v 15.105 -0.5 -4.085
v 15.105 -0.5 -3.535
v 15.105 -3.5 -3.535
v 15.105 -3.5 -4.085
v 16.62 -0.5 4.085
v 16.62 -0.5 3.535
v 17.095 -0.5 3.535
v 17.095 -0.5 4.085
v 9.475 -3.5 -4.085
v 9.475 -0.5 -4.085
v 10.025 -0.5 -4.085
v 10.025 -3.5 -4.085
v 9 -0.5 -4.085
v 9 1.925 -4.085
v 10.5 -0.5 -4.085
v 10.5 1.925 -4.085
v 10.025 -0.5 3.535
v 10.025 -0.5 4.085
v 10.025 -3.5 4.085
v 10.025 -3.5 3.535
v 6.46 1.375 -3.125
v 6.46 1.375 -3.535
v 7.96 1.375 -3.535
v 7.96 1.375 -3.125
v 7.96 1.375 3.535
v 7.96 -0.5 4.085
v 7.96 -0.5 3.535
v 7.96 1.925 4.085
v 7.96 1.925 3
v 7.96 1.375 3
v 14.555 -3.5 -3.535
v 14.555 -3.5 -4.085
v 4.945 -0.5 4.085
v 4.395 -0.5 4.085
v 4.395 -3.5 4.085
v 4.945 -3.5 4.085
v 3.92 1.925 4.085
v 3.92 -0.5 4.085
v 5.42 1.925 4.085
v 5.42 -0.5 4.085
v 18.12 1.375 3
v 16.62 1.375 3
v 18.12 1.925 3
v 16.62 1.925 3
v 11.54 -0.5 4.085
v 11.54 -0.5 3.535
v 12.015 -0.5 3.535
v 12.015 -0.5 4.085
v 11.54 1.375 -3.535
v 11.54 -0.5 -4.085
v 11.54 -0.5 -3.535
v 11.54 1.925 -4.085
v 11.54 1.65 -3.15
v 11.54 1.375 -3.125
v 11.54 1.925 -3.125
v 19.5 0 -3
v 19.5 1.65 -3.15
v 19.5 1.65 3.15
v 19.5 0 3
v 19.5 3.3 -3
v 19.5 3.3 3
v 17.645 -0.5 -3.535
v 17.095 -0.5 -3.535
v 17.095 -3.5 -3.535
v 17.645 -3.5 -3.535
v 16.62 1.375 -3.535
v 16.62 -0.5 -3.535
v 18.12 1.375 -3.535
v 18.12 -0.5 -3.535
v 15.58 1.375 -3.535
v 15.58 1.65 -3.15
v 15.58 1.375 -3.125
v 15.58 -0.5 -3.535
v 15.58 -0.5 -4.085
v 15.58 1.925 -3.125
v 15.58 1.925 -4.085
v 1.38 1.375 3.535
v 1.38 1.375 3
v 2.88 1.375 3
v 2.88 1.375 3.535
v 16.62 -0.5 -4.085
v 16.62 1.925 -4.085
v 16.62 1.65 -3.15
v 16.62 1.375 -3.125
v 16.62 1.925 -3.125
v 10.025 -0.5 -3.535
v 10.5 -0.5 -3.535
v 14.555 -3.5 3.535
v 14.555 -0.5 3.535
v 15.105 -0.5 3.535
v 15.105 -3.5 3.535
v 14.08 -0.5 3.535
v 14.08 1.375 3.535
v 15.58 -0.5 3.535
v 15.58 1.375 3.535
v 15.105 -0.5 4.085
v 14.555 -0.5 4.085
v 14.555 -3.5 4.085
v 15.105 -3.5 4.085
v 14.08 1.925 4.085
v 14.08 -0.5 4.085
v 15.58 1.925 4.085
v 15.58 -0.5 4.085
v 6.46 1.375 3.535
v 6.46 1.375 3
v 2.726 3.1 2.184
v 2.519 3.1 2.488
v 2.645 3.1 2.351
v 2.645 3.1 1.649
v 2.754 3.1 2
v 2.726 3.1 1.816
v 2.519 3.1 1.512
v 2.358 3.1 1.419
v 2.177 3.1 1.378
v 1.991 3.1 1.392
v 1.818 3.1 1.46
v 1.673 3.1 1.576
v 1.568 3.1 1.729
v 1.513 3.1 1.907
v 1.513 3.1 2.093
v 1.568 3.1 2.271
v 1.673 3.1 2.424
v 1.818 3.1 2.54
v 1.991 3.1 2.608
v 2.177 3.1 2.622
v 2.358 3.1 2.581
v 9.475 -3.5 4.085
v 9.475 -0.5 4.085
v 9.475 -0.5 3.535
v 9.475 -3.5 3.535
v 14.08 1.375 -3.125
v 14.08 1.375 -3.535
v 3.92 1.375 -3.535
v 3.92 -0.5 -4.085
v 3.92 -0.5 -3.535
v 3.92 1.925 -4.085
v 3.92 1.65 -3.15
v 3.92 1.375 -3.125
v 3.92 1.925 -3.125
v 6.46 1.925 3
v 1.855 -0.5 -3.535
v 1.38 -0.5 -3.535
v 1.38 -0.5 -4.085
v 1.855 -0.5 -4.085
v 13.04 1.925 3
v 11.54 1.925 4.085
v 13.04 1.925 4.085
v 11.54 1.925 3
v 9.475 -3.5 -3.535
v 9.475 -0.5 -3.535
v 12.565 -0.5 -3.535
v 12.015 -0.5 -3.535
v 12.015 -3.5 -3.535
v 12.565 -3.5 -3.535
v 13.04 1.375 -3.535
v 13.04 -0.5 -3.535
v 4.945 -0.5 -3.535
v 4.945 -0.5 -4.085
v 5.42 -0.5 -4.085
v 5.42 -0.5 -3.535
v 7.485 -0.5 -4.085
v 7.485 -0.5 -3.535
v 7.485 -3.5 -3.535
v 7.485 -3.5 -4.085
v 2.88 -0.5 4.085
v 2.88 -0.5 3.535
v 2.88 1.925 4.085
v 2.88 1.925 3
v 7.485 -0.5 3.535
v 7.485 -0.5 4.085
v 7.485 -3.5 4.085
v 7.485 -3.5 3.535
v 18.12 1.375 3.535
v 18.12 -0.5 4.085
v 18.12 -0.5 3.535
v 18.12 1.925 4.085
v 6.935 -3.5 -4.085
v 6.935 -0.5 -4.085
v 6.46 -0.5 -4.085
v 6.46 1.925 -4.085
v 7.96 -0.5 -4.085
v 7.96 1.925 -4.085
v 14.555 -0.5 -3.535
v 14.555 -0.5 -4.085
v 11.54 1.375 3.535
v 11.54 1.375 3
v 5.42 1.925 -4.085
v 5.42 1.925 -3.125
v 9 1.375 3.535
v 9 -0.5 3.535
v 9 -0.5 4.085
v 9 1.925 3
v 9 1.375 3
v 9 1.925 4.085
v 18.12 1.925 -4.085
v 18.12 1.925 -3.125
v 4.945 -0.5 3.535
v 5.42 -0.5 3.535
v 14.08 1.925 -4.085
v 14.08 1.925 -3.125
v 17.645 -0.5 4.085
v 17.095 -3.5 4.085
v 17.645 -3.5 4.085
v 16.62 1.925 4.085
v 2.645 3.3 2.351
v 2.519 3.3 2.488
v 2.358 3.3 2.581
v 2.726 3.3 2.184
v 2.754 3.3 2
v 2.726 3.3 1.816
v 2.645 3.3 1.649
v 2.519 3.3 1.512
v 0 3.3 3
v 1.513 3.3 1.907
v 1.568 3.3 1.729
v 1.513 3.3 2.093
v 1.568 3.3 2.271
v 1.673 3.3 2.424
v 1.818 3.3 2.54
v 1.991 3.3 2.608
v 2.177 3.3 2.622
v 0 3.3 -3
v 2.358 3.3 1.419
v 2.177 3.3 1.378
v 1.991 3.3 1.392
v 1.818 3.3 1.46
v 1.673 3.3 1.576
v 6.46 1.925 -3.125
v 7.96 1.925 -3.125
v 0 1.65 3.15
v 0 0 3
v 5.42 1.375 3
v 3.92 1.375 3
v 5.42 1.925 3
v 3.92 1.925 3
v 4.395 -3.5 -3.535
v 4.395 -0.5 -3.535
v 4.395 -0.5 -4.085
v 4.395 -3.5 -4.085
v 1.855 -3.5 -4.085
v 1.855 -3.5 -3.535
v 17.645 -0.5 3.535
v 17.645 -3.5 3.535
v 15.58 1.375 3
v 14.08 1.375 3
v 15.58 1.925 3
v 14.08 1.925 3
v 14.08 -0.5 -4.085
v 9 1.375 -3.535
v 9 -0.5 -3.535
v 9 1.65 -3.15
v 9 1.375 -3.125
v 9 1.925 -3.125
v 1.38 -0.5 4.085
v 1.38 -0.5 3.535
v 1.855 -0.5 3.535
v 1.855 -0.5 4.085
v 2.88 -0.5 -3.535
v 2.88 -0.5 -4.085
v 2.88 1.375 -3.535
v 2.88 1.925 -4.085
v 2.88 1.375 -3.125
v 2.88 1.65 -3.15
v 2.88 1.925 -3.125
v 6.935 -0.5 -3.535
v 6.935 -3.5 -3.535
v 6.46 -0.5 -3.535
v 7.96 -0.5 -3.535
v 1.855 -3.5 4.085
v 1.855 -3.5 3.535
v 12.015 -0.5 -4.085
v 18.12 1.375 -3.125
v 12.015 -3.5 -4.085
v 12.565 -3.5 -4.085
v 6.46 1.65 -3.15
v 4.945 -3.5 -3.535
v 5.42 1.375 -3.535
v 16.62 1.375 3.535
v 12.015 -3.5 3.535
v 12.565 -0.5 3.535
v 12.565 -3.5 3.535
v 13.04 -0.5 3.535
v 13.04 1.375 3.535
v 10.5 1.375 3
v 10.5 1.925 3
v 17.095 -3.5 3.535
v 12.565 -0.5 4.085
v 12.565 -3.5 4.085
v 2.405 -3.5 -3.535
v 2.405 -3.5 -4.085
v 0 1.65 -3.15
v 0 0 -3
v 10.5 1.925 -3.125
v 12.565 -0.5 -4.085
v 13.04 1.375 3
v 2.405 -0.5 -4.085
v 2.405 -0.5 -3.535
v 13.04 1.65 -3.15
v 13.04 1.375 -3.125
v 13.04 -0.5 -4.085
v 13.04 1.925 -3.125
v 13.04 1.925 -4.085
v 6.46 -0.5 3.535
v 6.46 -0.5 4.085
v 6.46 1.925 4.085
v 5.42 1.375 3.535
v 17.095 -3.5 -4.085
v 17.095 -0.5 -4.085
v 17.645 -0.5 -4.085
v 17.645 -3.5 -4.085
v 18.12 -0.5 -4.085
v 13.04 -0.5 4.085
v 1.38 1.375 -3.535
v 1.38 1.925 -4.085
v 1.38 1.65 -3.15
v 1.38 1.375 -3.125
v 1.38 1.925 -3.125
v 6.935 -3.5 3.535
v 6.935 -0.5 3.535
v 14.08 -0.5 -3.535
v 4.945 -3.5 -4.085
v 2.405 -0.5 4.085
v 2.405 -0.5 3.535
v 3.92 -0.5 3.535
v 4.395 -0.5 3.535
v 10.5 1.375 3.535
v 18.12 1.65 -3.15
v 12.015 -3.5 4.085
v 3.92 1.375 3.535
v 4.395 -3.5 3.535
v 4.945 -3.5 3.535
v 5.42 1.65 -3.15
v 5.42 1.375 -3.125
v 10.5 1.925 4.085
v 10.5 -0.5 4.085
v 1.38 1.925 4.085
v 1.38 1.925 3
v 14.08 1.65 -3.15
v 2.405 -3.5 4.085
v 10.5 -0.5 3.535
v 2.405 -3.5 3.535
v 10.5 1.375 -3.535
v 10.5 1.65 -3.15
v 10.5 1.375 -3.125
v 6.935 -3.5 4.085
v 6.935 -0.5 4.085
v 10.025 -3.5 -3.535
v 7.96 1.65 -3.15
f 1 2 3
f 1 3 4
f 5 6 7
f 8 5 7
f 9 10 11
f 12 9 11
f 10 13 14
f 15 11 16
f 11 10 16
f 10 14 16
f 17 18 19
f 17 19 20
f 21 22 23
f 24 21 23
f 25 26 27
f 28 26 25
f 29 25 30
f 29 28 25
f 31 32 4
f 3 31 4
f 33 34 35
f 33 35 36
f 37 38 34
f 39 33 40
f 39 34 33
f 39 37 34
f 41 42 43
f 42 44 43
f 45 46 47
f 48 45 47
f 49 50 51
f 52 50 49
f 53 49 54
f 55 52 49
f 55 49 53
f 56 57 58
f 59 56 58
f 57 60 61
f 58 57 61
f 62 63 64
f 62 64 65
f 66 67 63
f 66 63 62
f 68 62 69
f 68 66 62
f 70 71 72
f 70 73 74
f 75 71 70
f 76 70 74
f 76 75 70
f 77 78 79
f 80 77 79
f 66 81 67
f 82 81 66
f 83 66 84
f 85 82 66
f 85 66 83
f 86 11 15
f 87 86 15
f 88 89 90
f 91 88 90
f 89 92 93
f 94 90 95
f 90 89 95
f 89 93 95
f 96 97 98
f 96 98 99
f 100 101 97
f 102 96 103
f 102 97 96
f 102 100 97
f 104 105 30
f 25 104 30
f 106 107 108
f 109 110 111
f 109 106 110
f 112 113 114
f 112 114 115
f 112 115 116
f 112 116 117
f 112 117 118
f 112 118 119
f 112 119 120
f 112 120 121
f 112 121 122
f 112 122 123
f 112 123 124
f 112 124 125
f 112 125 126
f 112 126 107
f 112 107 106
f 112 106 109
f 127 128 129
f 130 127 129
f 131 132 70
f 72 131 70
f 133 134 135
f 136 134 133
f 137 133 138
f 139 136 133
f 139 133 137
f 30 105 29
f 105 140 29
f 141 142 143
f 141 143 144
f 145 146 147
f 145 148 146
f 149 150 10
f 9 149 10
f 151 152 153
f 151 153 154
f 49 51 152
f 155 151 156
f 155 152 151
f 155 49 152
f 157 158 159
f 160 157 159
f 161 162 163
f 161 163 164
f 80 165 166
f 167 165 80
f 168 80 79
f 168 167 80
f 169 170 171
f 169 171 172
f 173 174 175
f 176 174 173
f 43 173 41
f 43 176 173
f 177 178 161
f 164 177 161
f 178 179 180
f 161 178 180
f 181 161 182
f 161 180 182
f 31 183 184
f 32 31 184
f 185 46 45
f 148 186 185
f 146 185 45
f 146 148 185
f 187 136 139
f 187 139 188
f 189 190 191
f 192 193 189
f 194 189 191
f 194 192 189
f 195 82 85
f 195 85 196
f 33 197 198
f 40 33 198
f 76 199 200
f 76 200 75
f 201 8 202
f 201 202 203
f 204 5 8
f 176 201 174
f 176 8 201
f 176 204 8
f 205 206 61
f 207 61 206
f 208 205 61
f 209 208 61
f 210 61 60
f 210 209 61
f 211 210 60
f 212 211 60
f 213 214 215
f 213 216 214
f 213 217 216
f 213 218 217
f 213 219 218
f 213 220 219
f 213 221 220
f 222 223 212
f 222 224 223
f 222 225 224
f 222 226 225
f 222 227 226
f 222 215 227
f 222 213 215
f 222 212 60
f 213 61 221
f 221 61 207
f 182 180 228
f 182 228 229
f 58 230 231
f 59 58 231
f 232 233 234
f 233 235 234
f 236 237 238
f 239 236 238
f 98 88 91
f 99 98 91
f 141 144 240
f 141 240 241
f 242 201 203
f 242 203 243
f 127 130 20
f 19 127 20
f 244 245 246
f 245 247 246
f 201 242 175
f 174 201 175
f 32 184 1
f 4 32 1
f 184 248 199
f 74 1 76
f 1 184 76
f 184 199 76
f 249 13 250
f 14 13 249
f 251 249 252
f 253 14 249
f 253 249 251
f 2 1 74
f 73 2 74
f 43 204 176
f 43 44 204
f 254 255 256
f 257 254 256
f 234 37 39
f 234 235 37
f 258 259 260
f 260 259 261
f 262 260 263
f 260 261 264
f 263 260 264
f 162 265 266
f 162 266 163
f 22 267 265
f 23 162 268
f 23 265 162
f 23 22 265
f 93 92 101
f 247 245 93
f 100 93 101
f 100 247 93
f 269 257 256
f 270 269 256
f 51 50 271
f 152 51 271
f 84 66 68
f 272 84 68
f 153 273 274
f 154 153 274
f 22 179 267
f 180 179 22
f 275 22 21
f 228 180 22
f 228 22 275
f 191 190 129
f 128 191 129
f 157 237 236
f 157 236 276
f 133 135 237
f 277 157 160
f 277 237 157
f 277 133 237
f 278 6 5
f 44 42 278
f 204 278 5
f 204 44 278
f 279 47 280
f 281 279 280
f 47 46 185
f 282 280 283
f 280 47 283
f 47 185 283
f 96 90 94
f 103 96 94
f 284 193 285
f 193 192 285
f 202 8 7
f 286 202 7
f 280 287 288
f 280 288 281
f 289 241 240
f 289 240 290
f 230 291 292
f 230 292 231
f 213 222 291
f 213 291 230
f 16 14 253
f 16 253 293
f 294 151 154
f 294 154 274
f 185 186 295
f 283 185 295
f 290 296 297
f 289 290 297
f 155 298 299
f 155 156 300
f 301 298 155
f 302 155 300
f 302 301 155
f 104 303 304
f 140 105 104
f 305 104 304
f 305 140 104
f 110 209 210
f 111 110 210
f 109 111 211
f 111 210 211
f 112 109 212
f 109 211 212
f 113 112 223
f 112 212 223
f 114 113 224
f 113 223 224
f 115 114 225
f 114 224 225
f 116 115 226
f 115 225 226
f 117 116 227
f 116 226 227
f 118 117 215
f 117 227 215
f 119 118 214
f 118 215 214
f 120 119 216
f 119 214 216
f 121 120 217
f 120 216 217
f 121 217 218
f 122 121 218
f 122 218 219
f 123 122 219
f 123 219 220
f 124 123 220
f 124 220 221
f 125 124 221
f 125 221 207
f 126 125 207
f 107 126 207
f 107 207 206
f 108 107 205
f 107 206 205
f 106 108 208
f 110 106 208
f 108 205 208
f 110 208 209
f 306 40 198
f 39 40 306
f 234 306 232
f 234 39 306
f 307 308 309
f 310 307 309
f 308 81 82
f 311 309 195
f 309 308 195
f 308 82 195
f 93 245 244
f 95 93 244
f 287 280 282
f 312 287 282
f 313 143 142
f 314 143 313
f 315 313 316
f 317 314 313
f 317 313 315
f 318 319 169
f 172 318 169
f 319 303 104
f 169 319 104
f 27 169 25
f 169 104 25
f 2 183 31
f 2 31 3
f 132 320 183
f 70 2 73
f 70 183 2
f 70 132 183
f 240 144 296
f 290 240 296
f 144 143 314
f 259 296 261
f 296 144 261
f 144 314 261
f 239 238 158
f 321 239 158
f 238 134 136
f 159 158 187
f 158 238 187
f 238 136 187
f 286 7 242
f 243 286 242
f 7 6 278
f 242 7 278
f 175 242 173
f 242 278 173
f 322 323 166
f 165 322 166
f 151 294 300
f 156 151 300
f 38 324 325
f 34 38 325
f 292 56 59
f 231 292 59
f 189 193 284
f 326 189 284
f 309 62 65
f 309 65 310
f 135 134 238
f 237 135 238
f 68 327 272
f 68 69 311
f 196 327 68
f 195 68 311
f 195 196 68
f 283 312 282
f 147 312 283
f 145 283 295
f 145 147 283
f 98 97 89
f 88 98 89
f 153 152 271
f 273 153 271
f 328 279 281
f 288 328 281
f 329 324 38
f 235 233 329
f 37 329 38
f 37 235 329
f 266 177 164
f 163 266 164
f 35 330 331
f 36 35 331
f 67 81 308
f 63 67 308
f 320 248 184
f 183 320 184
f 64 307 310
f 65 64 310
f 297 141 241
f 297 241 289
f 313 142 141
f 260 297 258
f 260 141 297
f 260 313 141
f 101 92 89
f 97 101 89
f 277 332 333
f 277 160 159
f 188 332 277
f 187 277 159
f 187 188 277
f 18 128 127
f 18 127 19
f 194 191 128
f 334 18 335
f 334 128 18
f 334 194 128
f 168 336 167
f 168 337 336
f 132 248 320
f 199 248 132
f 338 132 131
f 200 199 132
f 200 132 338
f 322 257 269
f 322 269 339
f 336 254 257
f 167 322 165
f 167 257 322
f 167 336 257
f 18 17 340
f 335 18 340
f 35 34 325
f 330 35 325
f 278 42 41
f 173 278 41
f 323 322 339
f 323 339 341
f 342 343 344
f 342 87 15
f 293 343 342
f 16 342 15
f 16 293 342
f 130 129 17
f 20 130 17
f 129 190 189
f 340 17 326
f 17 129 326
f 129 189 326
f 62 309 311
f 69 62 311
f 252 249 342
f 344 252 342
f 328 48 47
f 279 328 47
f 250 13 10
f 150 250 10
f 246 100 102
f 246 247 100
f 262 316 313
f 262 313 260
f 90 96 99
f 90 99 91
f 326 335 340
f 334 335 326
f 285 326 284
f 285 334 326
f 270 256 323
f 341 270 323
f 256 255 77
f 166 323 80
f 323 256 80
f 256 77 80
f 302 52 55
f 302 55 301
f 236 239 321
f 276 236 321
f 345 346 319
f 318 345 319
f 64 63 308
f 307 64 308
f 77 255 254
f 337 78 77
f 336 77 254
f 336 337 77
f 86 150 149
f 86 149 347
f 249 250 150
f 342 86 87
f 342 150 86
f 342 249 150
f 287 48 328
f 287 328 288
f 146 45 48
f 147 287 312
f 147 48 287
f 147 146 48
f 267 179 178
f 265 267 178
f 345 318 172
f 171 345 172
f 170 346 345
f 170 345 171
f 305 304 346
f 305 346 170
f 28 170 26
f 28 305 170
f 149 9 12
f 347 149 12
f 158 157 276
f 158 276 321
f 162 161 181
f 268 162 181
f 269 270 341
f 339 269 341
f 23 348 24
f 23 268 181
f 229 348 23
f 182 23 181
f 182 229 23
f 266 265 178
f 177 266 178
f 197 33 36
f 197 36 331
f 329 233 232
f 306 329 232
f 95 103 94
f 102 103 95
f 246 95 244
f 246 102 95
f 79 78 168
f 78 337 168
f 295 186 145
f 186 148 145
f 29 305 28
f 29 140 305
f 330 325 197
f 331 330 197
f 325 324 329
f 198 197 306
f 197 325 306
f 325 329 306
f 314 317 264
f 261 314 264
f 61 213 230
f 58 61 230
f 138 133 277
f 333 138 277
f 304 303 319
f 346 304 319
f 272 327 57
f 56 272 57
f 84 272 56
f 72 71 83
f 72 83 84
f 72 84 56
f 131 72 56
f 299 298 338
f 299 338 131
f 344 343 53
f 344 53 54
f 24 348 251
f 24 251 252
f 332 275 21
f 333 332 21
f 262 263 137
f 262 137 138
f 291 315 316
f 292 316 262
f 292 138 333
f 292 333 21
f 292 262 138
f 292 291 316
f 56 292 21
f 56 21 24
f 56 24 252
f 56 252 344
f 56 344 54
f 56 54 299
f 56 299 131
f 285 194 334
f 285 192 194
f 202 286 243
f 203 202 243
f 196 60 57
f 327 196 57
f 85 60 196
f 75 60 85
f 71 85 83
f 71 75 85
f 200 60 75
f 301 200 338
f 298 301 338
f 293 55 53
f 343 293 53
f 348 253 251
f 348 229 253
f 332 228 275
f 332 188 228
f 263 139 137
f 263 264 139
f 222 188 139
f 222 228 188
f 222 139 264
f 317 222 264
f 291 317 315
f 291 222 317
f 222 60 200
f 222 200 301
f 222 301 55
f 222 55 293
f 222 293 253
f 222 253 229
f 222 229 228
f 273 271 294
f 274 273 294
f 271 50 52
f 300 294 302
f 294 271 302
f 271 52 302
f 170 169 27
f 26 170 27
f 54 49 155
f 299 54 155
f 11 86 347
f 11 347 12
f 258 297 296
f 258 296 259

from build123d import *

# Parameters (mm, degrees)
BOSS_EXTRUDE1_DEPTH      = 19.5
SKETCH5_W                = 1.5
SKETCH5_H                = 1.085
BOSS_EXTRUDE2_DEPTH      = 0.275
SKETCH5_3_W              = 1.5
SKETCH5_3_H              = 0.55
BOSS_EXTRUDE4_DEPTH      = 2.15
SKETCH3_W                = 0.55
SKETCH3_H                = 0.55
BOSS_EXTRUDE5_DEPTH      = 3.5
LPATTERN1_COUNT          = 7
LPATTERN1_PITCH          = 2.54
MIRROR3_COPY_1_SKETCH_W  = 1.5
MIRROR3_COPY_1_SKETCH_H  = 1.085
MIRROR3_COPY_1_DEPTH     = 0.275
MIRROR3_COPY_2_SKETCH_W  = 1.5
MIRROR3_COPY_2_SKETCH_H  = 1.085
MIRROR3_COPY_2_DEPTH     = 0.275
MIRROR3_COPY_3_SKETCH_W  = 1.5
MIRROR3_COPY_3_SKETCH_H  = 1.085
MIRROR3_COPY_3_DEPTH     = 0.275
MIRROR3_COPY_4_SKETCH_W  = 1.5
MIRROR3_COPY_4_SKETCH_H  = 1.085
MIRROR3_COPY_4_DEPTH     = 0.275
MIRROR3_COPY_5_SKETCH_W  = 1.5
MIRROR3_COPY_5_SKETCH_H  = 1.085
MIRROR3_COPY_5_DEPTH     = 0.275
MIRROR3_COPY_6_SKETCH_W  = 1.5
MIRROR3_COPY_6_SKETCH_H  = 1.085
MIRROR3_COPY_6_DEPTH     = 0.275
MIRROR3_COPY_7_SKETCH_W  = 1.5
MIRROR3_COPY_7_SKETCH_H  = 0.55
MIRROR3_COPY_7_DEPTH     = 2.15
MIRROR3_COPY_8_SKETCH_W  = 1.5
MIRROR3_COPY_8_SKETCH_H  = 0.55
MIRROR3_COPY_8_DEPTH     = 2.15
MIRROR3_COPY_9_SKETCH_W  = 1.5
MIRROR3_COPY_9_SKETCH_H  = 0.55
MIRROR3_COPY_9_DEPTH     = 2.15
MIRROR3_COPY_10_SKETCH_W = 1.5
MIRROR3_COPY_10_SKETCH_H = 0.55
MIRROR3_COPY_10_DEPTH    = 2.15
MIRROR3_COPY_11_SKETCH_W = 1.5
MIRROR3_COPY_11_SKETCH_H = 0.55
MIRROR3_COPY_11_DEPTH    = 2.15
MIRROR3_COPY_12_SKETCH_W = 1.5
MIRROR3_COPY_12_SKETCH_H = 0.55
MIRROR3_COPY_12_DEPTH    = 2.15
MIRROR3_COPY_13_SKETCH_W = 0.55
MIRROR3_COPY_13_SKETCH_H = 0.55
MIRROR3_COPY_13_DEPTH    = 3.5
MIRROR3_COPY_14_SKETCH_W = 0.55
MIRROR3_COPY_14_SKETCH_H = 0.55
MIRROR3_COPY_14_DEPTH    = 3.5
MIRROR3_COPY_15_SKETCH_W = 0.55
MIRROR3_COPY_15_SKETCH_H = 0.55
MIRROR3_COPY_15_DEPTH    = 3.5
MIRROR3_COPY_16_SKETCH_W = 0.55
MIRROR3_COPY_16_SKETCH_H = 0.55
MIRROR3_COPY_16_DEPTH    = 3.5
MIRROR3_COPY_17_SKETCH_W = 0.55
MIRROR3_COPY_17_SKETCH_H = 0.55
MIRROR3_COPY_17_DEPTH    = 3.5
MIRROR3_COPY_18_SKETCH_W = 0.55
MIRROR3_COPY_18_SKETCH_H = 0.55
MIRROR3_COPY_18_DEPTH    = 3.5
SKETCH6_R                = 0.623672025
CUT_EXTRUDE1_DEPTH       = 0.2


with BuildPart() as part:
    # Sketch2 → Boss-Extrude1 (new body)
    with BuildSketch(Plane(origin=(0, 0, 0), x_dir=(0, 0, -1), z_dir=(1, 0, 0))):
        Polygon((0, 0), (0, 3.3), (-3, 3.3), (-3.15, 1.65), (-3, 0), align=None)
    boss_extrude1 = extrude(amount=BOSS_EXTRUDE1_DEPTH)

    # Mirror2: Boss-Extrude1 across plane
    add(boss_extrude1.mirror(Plane.XY))


with BuildPart() as body_2:
    # Sketch5 → Boss-Extrude2 (new, symmetric)
    with BuildSketch(Plane(origin=(0, 1.65, 0), x_dir=(1, 0, 0), z_dir=(0, 1, 0))):
        with Locations((2.13, -3.5425)):
            Rectangle(SKETCH5_W, SKETCH5_H)
    boss_extrude2 = extrude(amount=BOSS_EXTRUDE2_DEPTH, both=True)

    # Sketch5<3> → Boss-Extrude4 (add)
    with BuildSketch(Plane(origin=(0, 1.65, 0), x_dir=(1, 0, 0), z_dir=(0, 1, 0))):
        with Locations((2.13, -3.81)):
            Rectangle(SKETCH5_3_W, SKETCH5_3_H)
    boss_extrude4 = extrude(amount=-BOSS_EXTRUDE4_DEPTH)

    # Sketch3 → Boss-Extrude5 (add)
    with BuildSketch(Plane(origin=(0, 0, 0), x_dir=(1, 0, 0), z_dir=(0, 1, 0))):
        with Locations((2.13, -3.81)):
            Rectangle(SKETCH3_W, SKETCH3_H)
    boss_extrude5 = extrude(amount=-BOSS_EXTRUDE5_DEPTH)


with BuildPart() as lpattern1_1:
    # LPattern1: Boss-Extrude2, Boss-Extrude4, Boss-Extrude5 ×7
    with Locations(*[(i * LPATTERN1_PITCH, 0, 0) for i in range(1, LPATTERN1_COUNT)]):
        add(boss_extrude2)
        add(boss_extrude4)
        add(boss_extrude5)


with BuildPart() as part_1:
    add(part.part)

    # Mirror3: Boss-Extrude2, Boss-Extrude4, Boss-Extrude5 across plane
    add(boss_extrude2.mirror(Plane.XY))
    add(boss_extrude4.mirror(Plane.XY))
    add(boss_extrude5.mirror(Plane.XY))

    # Mirror3 copy 1 sketch → Mirror3 copy 1 (add, symmetric)
    with BuildSketch(Plane(origin=(2.54, 1.65, 0), x_dir=(1, 0, 0), z_dir=(0, 1, 0))):
        with Locations((2.13, 3.5425)):
            Rectangle(MIRROR3_COPY_1_SKETCH_W, MIRROR3_COPY_1_SKETCH_H)
    extrude(amount=MIRROR3_COPY_1_DEPTH, both=True)

    # Mirror3 copy 2 sketch → Mirror3 copy 2 (add, symmetric)
    with BuildSketch(Plane(origin=(5.08, 1.65, 0), x_dir=(1, 0, 0), z_dir=(0, 1, 0))):
        with Locations((2.13, 3.5425)):
            Rectangle(MIRROR3_COPY_2_SKETCH_W, MIRROR3_COPY_2_SKETCH_H)
    extrude(amount=MIRROR3_COPY_2_DEPTH, both=True)

    # Mirror3 copy 3 sketch → Mirror3 copy 3 (add, symmetric)
    with BuildSketch(Plane(origin=(7.62, 1.65, 0), x_dir=(1, 0, 0), z_dir=(0, 1, 0))):
        with Locations((2.13, 3.5425)):
            Rectangle(MIRROR3_COPY_3_SKETCH_W, MIRROR3_COPY_3_SKETCH_H)
    extrude(amount=MIRROR3_COPY_3_DEPTH, both=True)

    # Mirror3 copy 4 sketch → Mirror3 copy 4 (add, symmetric)
    with BuildSketch(Plane(origin=(10.16, 1.65, 0), x_dir=(1, 0, 0), z_dir=(0, 1, 0))):
        with Locations((2.13, 3.5425)):
            Rectangle(MIRROR3_COPY_4_SKETCH_W, MIRROR3_COPY_4_SKETCH_H)
    extrude(amount=MIRROR3_COPY_4_DEPTH, both=True)

    # Mirror3 copy 5 sketch → Mirror3 copy 5 (add, symmetric)
    with BuildSketch(Plane(origin=(12.7, 1.65, 0), x_dir=(1, 0, 0), z_dir=(0, 1, 0))):
        with Locations((2.13, 3.5425)):
            Rectangle(MIRROR3_COPY_5_SKETCH_W, MIRROR3_COPY_5_SKETCH_H)
    extrude(amount=MIRROR3_COPY_5_DEPTH, both=True)

    # Mirror3 copy 6 sketch → Mirror3 copy 6 (add, symmetric)
    with BuildSketch(Plane(origin=(15.24, 1.65, 0), x_dir=(1, 0, 0), z_dir=(0, 1, 0))):
        with Locations((2.13, 3.5425)):
            Rectangle(MIRROR3_COPY_6_SKETCH_W, MIRROR3_COPY_6_SKETCH_H)
    extrude(amount=MIRROR3_COPY_6_DEPTH, both=True)

    # Mirror3 copy 7 sketch → Mirror3 copy 7 (add)
    with BuildSketch(Plane(origin=(2.54, 1.65, 0), x_dir=(1, 0, 0), z_dir=(0, 1, 0))):
        with Locations((2.13, 3.81)):
            Rectangle(MIRROR3_COPY_7_SKETCH_W, MIRROR3_COPY_7_SKETCH_H)
    extrude(amount=-MIRROR3_COPY_7_DEPTH)

    # Mirror3 copy 8 sketch → Mirror3 copy 8 (add)
    with BuildSketch(Plane(origin=(5.08, 1.65, 0), x_dir=(1, 0, 0), z_dir=(0, 1, 0))):
        with Locations((2.13, 3.81)):
            Rectangle(MIRROR3_COPY_8_SKETCH_W, MIRROR3_COPY_8_SKETCH_H)
    extrude(amount=-MIRROR3_COPY_8_DEPTH)

    # Mirror3 copy 9 sketch → Mirror3 copy 9 (add)
    with BuildSketch(Plane(origin=(7.62, 1.65, 0), x_dir=(1, 0, 0), z_dir=(0, 1, 0))):
        with Locations((2.13, 3.81)):
            Rectangle(MIRROR3_COPY_9_SKETCH_W, MIRROR3_COPY_9_SKETCH_H)
    extrude(amount=-MIRROR3_COPY_9_DEPTH)

    # Mirror3 copy 10 sketch → Mirror3 copy 10 (add)
    with BuildSketch(Plane(origin=(10.16, 1.65, 0), x_dir=(1, 0, 0), z_dir=(0, 1, 0))):
        with Locations((2.13, 3.81)):
            Rectangle(MIRROR3_COPY_10_SKETCH_W, MIRROR3_COPY_10_SKETCH_H)
    extrude(amount=-MIRROR3_COPY_10_DEPTH)

    # Mirror3 copy 11 sketch → Mirror3 copy 11 (add)
    with BuildSketch(Plane(origin=(12.7, 1.65, 0), x_dir=(1, 0, 0), z_dir=(0, 1, 0))):
        with Locations((2.13, 3.81)):
            Rectangle(MIRROR3_COPY_11_SKETCH_W, MIRROR3_COPY_11_SKETCH_H)
    extrude(amount=-MIRROR3_COPY_11_DEPTH)

    # Mirror3 copy 12 sketch → Mirror3 copy 12 (add)
    with BuildSketch(Plane(origin=(15.24, 1.65, 0), x_dir=(1, 0, 0), z_dir=(0, 1, 0))):
        with Locations((2.13, 3.81)):
            Rectangle(MIRROR3_COPY_12_SKETCH_W, MIRROR3_COPY_12_SKETCH_H)
    extrude(amount=-MIRROR3_COPY_12_DEPTH)

    # Mirror3 copy 13 sketch → Mirror3 copy 13 (add)
    with BuildSketch(Plane(origin=(2.54, 0, 0), x_dir=(1, 0, 0), z_dir=(0, 1, 0))):
        with Locations((2.13, 3.81)):
            Rectangle(MIRROR3_COPY_13_SKETCH_W, MIRROR3_COPY_13_SKETCH_H)
    extrude(amount=-MIRROR3_COPY_13_DEPTH)

    # Mirror3 copy 14 sketch → Mirror3 copy 14 (add)
    with BuildSketch(Plane(origin=(5.08, 0, 0), x_dir=(1, 0, 0), z_dir=(0, 1, 0))):
        with Locations((2.13, 3.81)):
            Rectangle(MIRROR3_COPY_14_SKETCH_W, MIRROR3_COPY_14_SKETCH_H)
    extrude(amount=-MIRROR3_COPY_14_DEPTH)

    # Mirror3 copy 15 sketch → Mirror3 copy 15 (add)
    with BuildSketch(Plane(origin=(7.62, 0, 0), x_dir=(1, 0, 0), z_dir=(0, 1, 0))):
        with Locations((2.13, 3.81)):
            Rectangle(MIRROR3_COPY_15_SKETCH_W, MIRROR3_COPY_15_SKETCH_H)
    extrude(amount=-MIRROR3_COPY_15_DEPTH)

    # Mirror3 copy 16 sketch → Mirror3 copy 16 (add)
    with BuildSketch(Plane(origin=(10.16, 0, 0), x_dir=(1, 0, 0), z_dir=(0, 1, 0))):
        with Locations((2.13, 3.81)):
            Rectangle(MIRROR3_COPY_16_SKETCH_W, MIRROR3_COPY_16_SKETCH_H)
    extrude(amount=-MIRROR3_COPY_16_DEPTH)

    # Mirror3 copy 17 sketch → Mirror3 copy 17 (add)
    with BuildSketch(Plane(origin=(12.7, 0, 0), x_dir=(1, 0, 0), z_dir=(0, 1, 0))):
        with Locations((2.13, 3.81)):
            Rectangle(MIRROR3_COPY_17_SKETCH_W, MIRROR3_COPY_17_SKETCH_H)
    extrude(amount=-MIRROR3_COPY_17_DEPTH)

    # Mirror3 copy 18 sketch → Mirror3 copy 18 (add)
    with BuildSketch(Plane(origin=(15.24, 0, 0), x_dir=(1, 0, 0), z_dir=(0, 1, 0))):
        with Locations((2.13, 3.81)):
            Rectangle(MIRROR3_COPY_18_SKETCH_W, MIRROR3_COPY_18_SKETCH_H)
    extrude(amount=-MIRROR3_COPY_18_DEPTH)

    # Sketch6 → Cut-Extrude1 (cut)
    with BuildSketch(Plane(origin=(0, 3.3, 0), x_dir=(1, 0, 0), z_dir=(0, 1, 0))):
        with Locations((2.13, -2)):
            Circle(SKETCH6_R)
    extrude(amount=-CUT_EXTRUDE1_DEPTH, mode=Mode.SUBTRACT)


solid = Compound([body_2.part, lpattern1_1.part, part_1.part])
